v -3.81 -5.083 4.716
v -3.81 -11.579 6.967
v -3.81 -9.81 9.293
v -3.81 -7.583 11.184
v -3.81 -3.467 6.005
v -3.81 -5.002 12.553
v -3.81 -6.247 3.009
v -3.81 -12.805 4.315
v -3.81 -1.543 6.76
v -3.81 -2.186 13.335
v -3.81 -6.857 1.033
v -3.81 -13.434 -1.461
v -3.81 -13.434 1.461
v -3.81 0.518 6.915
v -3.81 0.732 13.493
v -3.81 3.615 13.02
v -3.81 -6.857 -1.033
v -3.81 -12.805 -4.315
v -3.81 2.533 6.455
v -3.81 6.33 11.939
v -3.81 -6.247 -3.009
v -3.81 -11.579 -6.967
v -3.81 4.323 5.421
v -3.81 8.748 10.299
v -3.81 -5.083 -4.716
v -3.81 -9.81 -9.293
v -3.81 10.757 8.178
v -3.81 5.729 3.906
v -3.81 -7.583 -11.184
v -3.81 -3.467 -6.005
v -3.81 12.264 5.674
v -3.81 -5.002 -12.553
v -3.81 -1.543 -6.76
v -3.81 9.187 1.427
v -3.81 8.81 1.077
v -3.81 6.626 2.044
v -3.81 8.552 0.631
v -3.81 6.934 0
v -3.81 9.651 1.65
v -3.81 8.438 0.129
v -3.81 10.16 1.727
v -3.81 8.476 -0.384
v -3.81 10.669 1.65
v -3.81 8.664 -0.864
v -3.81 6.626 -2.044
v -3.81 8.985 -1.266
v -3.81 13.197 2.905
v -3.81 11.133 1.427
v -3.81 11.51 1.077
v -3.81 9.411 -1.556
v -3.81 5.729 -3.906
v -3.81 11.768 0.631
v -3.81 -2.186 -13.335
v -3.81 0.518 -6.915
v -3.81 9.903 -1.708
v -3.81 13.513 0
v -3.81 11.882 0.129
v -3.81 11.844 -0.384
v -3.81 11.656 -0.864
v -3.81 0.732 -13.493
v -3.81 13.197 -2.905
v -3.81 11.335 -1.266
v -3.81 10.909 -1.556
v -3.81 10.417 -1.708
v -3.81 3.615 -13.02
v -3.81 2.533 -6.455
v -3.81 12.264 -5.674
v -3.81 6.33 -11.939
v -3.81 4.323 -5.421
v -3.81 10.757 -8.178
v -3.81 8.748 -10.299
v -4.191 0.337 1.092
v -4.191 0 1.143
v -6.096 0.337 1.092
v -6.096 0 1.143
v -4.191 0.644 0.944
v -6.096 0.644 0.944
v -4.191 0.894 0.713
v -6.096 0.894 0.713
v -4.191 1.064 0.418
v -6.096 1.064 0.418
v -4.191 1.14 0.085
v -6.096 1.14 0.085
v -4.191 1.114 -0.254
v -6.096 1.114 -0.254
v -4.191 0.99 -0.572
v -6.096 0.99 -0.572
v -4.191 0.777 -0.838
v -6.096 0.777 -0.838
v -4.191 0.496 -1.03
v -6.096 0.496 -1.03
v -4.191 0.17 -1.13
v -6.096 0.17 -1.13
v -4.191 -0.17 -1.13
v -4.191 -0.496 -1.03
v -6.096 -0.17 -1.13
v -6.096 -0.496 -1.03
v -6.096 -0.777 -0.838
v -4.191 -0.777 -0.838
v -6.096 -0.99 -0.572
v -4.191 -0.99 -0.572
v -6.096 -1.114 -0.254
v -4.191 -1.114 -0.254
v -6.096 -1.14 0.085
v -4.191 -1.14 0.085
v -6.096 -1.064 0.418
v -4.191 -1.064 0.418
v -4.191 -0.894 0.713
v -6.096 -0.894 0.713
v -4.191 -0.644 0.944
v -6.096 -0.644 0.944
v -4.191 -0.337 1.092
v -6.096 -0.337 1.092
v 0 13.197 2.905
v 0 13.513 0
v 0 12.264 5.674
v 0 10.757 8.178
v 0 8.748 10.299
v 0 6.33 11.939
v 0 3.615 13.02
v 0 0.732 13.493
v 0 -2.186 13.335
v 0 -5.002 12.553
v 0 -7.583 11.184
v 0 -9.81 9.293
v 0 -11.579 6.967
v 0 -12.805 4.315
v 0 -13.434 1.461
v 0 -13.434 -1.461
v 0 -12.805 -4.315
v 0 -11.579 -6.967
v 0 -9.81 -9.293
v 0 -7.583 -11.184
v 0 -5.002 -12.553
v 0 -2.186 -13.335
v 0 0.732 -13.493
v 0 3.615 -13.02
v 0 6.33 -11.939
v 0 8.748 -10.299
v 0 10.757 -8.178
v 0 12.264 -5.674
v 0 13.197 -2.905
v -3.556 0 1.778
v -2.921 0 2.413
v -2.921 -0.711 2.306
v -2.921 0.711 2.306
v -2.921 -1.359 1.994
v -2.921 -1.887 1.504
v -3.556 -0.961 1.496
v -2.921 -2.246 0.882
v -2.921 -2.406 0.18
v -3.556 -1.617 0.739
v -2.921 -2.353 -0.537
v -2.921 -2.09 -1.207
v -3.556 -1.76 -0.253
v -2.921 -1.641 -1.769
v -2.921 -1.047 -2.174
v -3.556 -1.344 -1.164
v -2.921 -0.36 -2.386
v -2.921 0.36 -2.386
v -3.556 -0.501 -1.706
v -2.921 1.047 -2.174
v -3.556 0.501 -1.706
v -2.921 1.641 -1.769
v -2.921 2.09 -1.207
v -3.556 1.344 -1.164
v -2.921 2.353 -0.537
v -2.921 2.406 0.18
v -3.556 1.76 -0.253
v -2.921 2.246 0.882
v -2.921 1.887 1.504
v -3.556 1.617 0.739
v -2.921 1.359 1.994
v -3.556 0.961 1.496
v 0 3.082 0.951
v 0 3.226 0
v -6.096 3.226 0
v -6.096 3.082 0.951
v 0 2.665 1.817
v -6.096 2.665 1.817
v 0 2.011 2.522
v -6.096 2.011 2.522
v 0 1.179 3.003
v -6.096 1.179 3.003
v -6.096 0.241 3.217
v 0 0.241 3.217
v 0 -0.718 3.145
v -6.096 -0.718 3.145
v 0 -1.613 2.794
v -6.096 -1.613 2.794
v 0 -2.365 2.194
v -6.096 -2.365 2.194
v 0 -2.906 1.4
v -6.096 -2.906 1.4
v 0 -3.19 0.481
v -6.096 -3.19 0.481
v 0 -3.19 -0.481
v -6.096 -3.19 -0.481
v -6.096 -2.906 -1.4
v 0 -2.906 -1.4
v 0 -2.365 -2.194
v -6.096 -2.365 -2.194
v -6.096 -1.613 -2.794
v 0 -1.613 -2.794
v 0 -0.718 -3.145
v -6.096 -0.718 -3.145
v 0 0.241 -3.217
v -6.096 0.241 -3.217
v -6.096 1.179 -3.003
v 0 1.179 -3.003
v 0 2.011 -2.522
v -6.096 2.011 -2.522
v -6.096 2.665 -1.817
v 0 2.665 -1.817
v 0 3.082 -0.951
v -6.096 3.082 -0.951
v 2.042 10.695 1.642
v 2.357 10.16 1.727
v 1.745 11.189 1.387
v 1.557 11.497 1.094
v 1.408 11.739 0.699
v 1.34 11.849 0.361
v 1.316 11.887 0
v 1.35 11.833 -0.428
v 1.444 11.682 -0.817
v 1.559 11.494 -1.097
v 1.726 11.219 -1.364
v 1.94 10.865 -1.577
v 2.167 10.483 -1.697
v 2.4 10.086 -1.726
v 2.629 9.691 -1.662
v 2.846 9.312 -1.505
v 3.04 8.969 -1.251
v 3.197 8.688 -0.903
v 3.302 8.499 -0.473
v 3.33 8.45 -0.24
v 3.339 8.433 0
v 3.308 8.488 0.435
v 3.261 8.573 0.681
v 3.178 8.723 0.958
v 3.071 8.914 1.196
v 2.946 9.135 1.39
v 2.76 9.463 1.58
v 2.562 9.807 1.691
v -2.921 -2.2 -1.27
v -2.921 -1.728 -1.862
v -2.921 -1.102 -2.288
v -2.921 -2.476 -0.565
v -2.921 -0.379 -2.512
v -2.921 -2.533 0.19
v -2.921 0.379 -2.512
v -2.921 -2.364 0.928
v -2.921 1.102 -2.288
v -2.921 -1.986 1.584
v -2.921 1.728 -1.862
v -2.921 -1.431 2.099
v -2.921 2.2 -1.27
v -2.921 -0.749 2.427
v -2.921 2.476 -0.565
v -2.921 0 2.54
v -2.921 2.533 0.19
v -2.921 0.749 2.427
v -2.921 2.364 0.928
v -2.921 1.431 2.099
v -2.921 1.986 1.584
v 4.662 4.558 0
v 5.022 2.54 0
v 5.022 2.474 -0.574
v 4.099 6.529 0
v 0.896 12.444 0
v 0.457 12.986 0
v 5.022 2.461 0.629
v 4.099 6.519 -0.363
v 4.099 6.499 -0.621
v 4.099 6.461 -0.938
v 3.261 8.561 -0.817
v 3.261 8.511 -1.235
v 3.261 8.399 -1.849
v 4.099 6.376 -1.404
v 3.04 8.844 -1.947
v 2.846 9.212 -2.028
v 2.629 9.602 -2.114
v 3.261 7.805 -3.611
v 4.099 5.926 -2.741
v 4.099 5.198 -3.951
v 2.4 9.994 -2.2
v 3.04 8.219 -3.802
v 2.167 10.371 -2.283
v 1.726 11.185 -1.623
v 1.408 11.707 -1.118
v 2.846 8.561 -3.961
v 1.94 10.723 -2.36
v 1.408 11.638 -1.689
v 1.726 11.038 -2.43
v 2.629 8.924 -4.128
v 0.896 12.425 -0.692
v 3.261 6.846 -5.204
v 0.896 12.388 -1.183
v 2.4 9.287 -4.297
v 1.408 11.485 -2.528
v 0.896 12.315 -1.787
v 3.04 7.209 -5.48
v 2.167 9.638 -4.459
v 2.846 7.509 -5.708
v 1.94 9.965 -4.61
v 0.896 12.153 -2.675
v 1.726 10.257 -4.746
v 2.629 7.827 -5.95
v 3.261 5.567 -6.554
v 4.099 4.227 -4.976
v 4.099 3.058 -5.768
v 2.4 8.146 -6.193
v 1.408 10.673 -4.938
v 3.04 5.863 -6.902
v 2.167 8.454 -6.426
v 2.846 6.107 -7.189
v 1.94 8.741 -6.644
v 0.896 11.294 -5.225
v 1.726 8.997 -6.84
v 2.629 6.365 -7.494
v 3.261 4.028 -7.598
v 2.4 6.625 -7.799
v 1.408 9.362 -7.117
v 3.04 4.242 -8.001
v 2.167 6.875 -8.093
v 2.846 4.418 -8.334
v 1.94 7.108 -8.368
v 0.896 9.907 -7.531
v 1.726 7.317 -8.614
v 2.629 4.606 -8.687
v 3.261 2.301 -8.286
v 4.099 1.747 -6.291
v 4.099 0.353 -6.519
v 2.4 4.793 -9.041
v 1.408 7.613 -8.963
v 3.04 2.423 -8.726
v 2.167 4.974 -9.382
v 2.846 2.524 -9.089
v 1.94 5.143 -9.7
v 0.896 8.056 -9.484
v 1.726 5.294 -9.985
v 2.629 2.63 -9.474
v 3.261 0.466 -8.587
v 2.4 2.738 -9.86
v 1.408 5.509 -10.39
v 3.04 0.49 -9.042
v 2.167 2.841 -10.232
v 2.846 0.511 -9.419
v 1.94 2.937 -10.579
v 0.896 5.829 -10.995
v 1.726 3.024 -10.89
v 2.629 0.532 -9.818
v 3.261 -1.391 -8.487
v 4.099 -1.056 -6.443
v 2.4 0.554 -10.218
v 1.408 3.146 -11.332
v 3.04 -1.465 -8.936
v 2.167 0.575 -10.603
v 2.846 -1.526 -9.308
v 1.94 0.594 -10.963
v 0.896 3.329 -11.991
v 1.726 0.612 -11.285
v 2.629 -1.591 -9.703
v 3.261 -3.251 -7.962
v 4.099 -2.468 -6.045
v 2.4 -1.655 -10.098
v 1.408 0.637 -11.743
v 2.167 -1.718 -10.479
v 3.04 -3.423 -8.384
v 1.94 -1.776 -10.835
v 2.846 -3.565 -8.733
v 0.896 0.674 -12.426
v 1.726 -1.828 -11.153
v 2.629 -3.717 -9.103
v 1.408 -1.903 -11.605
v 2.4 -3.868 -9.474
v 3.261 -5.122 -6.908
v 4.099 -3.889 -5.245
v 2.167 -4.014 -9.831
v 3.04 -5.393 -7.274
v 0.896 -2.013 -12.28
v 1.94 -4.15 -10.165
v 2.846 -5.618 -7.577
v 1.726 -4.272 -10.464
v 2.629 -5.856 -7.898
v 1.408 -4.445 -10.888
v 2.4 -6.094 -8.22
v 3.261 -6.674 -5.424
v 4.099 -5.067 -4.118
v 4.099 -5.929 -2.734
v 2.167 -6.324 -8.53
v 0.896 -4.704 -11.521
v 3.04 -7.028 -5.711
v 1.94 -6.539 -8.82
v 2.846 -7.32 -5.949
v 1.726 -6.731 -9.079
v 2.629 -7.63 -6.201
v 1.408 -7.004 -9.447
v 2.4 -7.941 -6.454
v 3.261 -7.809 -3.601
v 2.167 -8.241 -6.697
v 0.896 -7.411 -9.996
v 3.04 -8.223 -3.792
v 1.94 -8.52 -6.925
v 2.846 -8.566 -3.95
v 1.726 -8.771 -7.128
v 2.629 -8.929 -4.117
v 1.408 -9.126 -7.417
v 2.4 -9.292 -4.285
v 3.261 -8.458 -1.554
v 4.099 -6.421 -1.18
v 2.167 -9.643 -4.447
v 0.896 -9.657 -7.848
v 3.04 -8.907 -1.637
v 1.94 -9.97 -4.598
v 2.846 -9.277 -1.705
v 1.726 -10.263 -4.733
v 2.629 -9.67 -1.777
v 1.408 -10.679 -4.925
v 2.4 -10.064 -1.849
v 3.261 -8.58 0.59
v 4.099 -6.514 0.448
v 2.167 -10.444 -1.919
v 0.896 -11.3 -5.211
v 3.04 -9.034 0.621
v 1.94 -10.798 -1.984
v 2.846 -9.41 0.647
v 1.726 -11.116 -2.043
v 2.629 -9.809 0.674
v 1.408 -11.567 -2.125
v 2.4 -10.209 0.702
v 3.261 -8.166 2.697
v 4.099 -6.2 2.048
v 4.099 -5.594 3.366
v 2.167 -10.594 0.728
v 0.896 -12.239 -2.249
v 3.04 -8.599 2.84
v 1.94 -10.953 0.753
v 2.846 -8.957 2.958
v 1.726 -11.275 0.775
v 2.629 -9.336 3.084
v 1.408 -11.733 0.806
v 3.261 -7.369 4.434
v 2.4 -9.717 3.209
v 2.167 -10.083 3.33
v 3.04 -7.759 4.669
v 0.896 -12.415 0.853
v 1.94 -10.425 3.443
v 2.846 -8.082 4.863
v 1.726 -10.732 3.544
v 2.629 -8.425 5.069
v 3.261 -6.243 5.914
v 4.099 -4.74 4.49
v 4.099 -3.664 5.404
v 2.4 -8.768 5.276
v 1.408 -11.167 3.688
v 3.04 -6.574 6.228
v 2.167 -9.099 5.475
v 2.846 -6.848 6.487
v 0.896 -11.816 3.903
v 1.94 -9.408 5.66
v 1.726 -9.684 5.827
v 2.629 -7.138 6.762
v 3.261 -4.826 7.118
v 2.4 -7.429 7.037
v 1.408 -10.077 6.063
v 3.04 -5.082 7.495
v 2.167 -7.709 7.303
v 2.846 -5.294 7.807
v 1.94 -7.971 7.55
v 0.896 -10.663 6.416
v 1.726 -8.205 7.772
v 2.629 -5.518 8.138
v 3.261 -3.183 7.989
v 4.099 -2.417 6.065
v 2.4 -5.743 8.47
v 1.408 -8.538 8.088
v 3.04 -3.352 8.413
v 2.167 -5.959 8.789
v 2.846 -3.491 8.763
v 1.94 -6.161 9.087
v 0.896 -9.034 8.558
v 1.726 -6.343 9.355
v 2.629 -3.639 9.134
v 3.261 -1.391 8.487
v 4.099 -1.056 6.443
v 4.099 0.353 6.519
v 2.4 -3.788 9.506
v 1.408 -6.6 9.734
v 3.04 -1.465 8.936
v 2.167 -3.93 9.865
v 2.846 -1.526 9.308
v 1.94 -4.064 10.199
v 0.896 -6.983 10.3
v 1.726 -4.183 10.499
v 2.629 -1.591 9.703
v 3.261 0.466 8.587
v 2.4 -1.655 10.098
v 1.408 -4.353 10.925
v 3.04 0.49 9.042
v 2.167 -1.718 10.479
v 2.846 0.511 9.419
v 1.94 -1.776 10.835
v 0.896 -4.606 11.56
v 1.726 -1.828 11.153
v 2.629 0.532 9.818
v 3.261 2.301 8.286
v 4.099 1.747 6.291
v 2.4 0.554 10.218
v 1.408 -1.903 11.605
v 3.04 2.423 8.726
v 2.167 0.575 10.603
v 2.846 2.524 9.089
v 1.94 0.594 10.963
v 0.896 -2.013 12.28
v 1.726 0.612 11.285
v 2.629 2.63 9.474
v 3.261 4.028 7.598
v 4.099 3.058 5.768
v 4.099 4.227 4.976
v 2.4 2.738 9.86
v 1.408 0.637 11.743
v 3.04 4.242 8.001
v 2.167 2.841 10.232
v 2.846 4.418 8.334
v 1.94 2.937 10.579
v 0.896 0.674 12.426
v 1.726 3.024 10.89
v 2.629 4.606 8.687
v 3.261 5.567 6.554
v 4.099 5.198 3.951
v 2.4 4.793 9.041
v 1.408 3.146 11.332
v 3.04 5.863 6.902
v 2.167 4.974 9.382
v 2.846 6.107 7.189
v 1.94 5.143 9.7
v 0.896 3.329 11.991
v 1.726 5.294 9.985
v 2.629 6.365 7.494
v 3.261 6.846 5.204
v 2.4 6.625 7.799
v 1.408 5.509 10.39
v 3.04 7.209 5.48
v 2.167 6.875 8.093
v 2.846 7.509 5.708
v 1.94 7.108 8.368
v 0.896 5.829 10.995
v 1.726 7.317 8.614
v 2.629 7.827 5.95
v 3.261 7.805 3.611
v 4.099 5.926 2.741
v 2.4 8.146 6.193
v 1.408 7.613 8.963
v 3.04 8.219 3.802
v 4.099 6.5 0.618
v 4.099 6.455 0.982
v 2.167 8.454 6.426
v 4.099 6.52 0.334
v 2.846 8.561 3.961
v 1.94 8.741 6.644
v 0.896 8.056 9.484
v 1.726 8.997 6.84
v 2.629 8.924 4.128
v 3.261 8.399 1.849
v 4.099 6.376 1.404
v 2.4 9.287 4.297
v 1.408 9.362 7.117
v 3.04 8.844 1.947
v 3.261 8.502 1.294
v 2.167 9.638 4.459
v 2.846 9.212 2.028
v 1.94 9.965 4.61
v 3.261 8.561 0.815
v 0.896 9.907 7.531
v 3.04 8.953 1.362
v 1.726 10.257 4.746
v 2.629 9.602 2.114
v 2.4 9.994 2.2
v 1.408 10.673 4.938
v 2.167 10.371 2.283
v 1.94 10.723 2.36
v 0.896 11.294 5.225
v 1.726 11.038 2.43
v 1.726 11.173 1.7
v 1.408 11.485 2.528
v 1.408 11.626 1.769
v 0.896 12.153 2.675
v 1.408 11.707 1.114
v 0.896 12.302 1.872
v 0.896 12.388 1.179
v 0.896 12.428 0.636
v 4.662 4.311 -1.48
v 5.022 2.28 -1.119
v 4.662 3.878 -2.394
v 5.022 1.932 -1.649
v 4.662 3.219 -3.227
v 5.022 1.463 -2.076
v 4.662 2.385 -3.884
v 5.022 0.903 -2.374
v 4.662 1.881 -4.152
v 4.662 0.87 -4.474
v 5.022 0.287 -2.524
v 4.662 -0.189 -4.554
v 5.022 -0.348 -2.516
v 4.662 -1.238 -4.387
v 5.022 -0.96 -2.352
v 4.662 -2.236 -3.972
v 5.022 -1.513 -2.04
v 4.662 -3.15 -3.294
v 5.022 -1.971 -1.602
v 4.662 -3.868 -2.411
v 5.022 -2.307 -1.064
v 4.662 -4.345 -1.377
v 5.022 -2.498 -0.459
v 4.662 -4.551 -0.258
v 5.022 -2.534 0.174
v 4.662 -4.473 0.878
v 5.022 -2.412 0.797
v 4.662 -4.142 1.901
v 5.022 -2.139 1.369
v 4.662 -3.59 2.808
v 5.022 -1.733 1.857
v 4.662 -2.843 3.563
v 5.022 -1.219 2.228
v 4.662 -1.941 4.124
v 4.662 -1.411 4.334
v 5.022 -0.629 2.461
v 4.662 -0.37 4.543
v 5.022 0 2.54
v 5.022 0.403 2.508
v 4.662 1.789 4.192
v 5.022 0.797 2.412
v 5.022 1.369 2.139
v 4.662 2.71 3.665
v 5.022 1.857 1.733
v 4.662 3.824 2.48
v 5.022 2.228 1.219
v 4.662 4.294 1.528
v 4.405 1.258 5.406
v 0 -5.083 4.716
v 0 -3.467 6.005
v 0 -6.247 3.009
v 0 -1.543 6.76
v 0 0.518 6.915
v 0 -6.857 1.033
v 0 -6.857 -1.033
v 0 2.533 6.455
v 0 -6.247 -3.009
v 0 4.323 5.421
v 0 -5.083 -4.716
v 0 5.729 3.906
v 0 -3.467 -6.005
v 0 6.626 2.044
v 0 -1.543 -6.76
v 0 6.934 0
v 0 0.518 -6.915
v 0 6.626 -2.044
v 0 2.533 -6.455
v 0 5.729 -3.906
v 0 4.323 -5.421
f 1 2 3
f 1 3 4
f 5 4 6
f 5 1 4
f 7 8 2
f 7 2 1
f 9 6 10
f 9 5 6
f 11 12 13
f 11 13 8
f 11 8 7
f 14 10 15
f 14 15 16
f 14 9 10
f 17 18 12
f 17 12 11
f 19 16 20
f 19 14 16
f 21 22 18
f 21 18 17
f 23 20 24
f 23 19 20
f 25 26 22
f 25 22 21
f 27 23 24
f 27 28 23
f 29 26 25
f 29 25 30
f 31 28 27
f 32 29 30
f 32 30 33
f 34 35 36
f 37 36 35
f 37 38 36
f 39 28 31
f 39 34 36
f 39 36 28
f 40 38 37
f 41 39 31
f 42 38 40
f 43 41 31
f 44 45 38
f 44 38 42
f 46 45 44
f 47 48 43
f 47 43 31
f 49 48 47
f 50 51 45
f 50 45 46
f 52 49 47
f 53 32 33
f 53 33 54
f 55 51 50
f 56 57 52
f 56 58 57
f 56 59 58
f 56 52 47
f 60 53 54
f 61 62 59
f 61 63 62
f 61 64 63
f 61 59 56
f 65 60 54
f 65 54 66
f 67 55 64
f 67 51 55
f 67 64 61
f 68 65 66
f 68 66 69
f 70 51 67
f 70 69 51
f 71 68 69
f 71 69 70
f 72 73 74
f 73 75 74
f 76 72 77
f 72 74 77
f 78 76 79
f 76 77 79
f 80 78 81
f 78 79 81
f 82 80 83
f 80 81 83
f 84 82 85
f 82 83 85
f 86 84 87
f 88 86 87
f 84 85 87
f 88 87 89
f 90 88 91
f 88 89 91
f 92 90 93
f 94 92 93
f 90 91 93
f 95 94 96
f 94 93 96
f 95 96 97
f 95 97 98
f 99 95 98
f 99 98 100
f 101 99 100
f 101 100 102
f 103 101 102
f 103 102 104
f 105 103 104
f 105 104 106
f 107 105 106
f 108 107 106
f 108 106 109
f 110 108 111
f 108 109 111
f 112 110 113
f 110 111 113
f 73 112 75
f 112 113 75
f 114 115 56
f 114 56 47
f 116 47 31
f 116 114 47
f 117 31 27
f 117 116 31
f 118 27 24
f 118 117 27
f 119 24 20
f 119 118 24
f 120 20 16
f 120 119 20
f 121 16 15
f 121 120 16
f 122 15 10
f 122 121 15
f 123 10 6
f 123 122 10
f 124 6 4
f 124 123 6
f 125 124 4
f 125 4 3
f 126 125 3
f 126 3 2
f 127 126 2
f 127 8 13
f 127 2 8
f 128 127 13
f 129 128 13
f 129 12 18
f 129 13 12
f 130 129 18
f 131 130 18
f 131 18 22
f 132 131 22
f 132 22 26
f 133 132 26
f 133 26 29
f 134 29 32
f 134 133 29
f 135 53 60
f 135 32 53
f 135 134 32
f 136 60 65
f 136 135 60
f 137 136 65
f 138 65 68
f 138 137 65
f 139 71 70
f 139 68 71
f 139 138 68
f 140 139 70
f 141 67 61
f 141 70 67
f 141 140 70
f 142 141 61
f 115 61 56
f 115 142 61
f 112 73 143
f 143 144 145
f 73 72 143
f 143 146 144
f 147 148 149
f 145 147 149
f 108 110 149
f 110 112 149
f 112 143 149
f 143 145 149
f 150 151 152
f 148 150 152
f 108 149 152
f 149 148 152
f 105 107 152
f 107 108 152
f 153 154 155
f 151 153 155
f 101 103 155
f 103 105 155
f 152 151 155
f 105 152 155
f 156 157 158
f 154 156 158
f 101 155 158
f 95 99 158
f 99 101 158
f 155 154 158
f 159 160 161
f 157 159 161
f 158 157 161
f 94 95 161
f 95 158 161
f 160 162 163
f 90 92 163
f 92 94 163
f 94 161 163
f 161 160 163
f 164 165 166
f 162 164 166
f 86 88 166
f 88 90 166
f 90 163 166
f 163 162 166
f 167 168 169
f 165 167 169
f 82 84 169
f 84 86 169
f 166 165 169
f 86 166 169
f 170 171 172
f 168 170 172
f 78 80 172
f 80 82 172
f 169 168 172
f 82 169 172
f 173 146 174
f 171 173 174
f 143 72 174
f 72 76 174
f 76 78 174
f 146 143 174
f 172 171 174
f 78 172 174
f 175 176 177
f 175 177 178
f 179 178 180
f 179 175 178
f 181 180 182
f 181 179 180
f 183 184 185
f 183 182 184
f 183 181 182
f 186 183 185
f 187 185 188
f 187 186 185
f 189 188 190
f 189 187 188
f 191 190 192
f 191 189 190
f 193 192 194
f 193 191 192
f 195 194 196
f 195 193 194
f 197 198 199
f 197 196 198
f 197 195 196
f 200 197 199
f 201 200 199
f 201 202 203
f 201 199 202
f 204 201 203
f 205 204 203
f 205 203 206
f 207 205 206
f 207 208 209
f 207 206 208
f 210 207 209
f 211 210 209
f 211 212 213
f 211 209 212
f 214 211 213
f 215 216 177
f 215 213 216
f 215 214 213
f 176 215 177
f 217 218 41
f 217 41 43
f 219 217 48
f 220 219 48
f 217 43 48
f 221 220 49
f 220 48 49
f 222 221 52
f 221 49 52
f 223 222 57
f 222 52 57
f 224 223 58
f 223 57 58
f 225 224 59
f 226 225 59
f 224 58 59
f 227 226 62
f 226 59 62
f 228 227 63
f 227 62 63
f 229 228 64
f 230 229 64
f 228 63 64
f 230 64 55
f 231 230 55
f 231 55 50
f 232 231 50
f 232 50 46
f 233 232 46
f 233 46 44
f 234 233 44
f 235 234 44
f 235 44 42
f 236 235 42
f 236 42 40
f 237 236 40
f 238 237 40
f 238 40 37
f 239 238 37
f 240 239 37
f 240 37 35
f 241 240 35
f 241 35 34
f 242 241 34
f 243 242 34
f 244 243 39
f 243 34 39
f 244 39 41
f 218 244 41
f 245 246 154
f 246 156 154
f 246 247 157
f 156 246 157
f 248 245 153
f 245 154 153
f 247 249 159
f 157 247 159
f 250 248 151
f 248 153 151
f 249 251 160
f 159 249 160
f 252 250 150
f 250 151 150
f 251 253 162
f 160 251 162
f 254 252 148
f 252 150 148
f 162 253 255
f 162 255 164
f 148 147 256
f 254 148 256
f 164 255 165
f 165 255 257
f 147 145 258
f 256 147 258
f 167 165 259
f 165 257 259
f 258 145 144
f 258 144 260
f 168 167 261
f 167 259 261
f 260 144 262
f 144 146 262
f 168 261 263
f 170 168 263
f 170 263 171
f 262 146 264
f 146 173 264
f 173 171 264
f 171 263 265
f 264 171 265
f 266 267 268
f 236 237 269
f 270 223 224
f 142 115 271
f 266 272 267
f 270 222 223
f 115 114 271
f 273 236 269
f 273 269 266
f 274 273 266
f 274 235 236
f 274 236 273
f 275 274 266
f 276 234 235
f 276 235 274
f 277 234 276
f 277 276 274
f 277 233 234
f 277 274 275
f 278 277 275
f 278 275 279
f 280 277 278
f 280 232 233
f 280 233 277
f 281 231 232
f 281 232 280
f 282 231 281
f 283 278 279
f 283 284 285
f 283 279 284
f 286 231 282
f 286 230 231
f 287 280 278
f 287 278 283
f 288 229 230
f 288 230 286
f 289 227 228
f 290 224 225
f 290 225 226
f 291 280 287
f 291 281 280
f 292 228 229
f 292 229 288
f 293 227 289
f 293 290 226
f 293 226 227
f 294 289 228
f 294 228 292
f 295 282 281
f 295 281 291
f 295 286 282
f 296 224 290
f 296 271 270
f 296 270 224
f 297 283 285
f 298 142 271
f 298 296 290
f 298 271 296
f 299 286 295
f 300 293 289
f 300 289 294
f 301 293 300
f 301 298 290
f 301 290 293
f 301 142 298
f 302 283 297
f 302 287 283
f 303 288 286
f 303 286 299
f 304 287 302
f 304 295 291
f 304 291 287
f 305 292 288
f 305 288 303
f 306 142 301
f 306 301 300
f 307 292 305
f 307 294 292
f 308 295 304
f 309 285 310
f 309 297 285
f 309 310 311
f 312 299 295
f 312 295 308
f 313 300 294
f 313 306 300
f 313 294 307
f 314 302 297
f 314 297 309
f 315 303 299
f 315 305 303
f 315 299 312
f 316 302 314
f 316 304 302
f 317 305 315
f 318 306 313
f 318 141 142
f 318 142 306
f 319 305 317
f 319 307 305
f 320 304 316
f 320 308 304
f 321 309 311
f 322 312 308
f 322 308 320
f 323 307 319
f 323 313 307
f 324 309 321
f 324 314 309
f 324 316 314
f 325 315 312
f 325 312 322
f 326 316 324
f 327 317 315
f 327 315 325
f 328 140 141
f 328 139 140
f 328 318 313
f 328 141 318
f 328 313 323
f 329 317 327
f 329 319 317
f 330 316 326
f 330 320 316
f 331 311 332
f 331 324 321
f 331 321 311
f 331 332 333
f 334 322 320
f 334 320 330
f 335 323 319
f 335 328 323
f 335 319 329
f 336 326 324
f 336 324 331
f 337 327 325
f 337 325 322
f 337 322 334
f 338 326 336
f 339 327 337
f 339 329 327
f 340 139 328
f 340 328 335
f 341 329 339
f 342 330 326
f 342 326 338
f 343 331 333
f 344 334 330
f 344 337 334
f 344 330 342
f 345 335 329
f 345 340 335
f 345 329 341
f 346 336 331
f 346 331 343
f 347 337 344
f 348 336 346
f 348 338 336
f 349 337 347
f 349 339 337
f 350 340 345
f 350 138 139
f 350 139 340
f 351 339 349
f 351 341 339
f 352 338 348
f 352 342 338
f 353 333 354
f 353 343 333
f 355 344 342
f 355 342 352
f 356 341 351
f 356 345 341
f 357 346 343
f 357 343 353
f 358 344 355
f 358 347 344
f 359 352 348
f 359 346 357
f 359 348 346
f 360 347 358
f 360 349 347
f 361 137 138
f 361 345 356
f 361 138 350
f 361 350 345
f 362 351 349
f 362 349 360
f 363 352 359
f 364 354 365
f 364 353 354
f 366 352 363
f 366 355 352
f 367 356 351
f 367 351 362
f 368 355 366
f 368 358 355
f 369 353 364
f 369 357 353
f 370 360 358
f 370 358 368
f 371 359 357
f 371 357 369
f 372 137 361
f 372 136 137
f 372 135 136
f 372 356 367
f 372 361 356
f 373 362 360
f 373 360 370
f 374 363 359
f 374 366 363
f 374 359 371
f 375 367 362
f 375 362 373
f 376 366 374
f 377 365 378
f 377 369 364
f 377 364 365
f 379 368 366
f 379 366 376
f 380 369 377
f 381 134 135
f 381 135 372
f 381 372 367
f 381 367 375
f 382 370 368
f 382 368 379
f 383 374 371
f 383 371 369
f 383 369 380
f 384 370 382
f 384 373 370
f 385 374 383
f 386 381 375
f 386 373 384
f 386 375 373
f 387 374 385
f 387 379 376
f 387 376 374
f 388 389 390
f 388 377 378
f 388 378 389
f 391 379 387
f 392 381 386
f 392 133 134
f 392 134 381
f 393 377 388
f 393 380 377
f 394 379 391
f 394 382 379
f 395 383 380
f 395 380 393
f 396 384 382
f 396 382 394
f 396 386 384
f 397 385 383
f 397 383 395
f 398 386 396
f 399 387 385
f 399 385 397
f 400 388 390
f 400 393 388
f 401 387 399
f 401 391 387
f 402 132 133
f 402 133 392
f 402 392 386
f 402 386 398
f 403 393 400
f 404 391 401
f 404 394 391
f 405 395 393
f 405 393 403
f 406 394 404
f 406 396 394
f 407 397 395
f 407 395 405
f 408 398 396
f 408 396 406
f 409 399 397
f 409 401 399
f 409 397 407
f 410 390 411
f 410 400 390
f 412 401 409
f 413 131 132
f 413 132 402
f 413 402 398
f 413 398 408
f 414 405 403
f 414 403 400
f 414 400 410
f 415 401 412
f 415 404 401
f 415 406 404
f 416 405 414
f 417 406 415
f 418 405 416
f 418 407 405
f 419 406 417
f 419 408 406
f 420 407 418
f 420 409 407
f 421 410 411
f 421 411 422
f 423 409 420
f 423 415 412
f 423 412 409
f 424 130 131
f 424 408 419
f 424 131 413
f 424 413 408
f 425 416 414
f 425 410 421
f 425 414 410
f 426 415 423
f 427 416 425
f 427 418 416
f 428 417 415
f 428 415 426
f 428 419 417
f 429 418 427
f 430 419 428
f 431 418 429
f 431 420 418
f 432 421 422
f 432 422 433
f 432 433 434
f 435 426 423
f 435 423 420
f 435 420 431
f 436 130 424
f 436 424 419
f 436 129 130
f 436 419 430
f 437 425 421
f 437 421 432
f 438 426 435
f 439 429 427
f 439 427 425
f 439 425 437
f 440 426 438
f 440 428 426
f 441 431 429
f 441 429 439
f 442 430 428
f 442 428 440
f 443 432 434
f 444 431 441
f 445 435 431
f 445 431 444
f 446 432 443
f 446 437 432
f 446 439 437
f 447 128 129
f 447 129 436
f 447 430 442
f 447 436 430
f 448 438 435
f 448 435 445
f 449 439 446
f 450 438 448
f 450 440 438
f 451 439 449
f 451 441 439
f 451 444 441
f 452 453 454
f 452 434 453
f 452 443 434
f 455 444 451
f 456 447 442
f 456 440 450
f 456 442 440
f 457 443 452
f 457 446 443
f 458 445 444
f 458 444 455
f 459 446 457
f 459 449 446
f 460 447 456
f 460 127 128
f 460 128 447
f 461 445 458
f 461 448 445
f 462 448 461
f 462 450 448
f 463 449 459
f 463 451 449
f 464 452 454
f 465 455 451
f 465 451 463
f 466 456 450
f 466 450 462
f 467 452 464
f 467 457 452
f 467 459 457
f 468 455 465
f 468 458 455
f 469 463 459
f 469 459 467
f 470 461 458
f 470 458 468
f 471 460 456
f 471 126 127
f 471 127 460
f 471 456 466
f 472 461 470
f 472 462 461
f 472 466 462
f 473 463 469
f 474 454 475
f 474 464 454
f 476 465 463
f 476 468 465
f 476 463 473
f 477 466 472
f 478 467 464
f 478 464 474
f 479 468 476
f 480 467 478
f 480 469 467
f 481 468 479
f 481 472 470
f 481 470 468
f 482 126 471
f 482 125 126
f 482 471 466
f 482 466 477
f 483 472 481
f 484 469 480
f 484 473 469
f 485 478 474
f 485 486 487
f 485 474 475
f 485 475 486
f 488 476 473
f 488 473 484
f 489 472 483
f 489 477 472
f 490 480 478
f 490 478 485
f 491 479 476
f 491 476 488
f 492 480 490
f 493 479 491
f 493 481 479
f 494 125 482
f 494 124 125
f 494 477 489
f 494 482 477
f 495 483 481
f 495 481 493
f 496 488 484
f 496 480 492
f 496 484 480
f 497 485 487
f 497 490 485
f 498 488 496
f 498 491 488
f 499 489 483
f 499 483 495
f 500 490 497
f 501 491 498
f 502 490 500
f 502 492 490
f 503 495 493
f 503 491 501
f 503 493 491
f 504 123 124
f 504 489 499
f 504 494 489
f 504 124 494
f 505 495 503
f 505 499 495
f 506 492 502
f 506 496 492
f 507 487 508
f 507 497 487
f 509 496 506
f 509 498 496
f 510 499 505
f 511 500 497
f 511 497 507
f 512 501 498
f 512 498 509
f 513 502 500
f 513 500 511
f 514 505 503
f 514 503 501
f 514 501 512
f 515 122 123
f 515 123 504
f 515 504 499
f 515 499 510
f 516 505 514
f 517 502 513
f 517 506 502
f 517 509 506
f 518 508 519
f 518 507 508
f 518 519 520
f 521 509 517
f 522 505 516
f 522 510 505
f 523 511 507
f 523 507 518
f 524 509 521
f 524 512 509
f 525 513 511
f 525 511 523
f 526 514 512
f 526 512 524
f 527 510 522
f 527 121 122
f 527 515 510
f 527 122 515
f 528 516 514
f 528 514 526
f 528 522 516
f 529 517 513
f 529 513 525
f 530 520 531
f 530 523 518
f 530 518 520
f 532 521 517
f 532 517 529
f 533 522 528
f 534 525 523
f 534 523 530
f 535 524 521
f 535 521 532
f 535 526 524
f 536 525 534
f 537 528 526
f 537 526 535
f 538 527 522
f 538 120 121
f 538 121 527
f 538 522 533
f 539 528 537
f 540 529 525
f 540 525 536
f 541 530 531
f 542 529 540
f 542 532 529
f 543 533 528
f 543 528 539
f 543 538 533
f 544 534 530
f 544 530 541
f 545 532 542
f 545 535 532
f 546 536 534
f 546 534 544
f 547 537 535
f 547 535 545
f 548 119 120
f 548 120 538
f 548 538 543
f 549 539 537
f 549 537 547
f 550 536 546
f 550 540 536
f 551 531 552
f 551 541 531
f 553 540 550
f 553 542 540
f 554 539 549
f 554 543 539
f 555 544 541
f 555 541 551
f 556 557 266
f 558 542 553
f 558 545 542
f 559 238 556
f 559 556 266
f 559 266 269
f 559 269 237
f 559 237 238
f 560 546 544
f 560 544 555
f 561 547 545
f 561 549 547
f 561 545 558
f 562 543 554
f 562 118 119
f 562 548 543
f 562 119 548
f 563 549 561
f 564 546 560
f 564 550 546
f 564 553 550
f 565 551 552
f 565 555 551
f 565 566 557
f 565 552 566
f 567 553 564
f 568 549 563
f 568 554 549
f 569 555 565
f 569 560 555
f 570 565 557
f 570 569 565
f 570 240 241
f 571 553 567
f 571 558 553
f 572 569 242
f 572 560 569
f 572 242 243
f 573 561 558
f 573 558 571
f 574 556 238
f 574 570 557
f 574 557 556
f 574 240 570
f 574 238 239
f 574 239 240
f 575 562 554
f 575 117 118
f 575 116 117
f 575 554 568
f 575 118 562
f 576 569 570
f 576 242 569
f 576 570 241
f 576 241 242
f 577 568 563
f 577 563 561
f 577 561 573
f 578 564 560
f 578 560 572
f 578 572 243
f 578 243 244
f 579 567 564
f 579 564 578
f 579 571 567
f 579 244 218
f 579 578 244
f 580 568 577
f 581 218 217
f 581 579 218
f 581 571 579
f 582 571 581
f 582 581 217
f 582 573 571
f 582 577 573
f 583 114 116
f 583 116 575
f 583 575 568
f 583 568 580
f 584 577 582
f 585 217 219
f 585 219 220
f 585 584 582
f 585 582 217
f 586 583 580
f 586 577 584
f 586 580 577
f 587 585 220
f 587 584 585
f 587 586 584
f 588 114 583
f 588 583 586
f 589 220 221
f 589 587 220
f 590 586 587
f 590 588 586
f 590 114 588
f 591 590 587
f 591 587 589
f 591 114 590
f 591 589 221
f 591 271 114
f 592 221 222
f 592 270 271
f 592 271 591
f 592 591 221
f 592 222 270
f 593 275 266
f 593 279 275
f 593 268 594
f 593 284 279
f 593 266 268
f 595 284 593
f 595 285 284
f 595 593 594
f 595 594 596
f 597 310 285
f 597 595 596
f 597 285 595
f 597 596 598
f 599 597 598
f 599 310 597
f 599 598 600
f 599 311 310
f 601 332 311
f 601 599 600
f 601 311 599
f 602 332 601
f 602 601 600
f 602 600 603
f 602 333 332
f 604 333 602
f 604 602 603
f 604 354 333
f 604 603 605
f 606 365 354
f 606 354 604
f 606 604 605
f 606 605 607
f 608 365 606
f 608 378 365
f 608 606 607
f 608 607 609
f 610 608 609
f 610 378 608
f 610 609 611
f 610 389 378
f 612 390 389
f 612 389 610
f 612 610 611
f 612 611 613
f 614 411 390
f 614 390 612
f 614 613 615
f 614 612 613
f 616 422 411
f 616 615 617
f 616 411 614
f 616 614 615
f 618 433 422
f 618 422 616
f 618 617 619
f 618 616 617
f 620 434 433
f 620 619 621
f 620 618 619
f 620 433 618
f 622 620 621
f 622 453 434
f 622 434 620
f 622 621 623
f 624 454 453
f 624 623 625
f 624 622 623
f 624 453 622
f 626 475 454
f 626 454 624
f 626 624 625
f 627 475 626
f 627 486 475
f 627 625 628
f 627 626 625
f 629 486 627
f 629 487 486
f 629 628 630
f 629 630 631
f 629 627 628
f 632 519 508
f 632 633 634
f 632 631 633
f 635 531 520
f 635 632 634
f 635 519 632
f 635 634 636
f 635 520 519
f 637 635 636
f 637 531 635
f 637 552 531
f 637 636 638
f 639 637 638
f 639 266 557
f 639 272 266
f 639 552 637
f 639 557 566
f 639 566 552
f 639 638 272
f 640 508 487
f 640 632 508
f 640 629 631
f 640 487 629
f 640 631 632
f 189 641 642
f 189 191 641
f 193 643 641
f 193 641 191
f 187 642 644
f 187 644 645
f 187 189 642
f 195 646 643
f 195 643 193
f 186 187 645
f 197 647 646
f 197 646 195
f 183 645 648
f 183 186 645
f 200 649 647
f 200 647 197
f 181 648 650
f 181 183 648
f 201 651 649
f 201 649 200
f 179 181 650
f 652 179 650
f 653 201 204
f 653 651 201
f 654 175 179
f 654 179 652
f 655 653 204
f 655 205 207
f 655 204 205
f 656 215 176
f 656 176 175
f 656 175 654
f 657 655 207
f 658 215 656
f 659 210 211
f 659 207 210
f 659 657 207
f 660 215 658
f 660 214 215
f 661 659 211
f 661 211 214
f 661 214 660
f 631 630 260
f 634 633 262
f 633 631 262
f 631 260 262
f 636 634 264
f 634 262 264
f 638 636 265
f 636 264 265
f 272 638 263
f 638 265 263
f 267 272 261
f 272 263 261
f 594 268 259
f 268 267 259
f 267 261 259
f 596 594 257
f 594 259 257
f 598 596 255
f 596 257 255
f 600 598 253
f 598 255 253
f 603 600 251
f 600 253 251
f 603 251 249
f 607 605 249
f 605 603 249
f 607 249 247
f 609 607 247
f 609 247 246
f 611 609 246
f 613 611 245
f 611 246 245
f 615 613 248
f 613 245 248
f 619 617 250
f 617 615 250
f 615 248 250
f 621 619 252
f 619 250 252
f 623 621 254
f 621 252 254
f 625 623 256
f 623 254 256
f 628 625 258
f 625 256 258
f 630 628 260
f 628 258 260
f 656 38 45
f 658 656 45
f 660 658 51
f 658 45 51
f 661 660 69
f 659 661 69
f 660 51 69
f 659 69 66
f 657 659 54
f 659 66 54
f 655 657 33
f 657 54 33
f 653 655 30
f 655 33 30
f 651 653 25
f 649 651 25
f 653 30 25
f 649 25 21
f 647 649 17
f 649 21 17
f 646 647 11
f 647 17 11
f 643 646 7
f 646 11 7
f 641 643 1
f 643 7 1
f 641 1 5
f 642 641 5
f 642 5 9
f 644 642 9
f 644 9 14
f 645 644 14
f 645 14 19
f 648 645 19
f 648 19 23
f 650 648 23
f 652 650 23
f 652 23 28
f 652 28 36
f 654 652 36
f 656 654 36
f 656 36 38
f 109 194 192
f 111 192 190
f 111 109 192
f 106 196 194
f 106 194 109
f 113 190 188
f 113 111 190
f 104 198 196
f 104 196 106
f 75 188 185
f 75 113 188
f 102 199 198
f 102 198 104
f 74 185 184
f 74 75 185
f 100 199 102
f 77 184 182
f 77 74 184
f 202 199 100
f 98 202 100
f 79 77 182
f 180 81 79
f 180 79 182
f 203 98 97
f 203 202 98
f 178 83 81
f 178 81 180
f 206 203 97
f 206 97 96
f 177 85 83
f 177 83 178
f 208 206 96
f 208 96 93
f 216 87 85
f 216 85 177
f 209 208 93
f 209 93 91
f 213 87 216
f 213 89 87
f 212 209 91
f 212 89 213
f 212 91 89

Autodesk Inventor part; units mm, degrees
ref_plane "XZ Plane" through (0, 0, 0) normal (0, 1, 0) x (-1, 0, 0)
sketch "Sketch1" plane through (0, 0, 0) normal (0, 0, 1) x (1, 0, 0)
  line L0 (0, 0) -> (-8.052, 0) construction
  line L1 (-6.096, 2.032) -> (5.08, 2.032)
  line L2 (-6.096, 2.032) -> (-6.096, 3.2258)
  line L3 (-6.096, 3.2258) -> (0, 3.2258)
  line L4 (0, 3.2258) -> (0, 6.9342)
  line L5 (0, 6.9342) -> (-3.81, 6.9342)
  line L6 (-3.81, 6.9342) -> (-3.81, 13.5128)
  line L7 (-3.81, 13.5128) -> (0, 13.5128)
  arc A0 (5.08, 2.032) -> (0, 13.5128) centre (-15.0256, 0) ccw
  dimension "d0" = 2.032
  dimension "d1" = 13.5128
  dimension "d2" = 6.096
  dimension "d3" = 3.2258
  dimension "d4" = 3.81
  dimension "d5" = 6.9342
  dimension "d7" = 5.08
revolve "Revolution1" add sketch "Sketch1" angle 360 about axis through (0, 0, 0) along (-1, 0, 0)
ref_plane "Work Plane3" through (3.9124, 0, 0) normal (1, 0, 0) x (0, 1, 0)
ref_plane "Work Plane2" through (5.1824, 0, 0) normal (1, 0, 0) x (0, 1, 0)
sketch "Sketch4" plane through (-3.81, 0, 0) normal (-1, 0, 0) x (0, 0, 1)
  circle A0 centre (0, 10.16) radius 1.7272 projected
extrude "Extrusion3" cut sketch "Sketch4" against normal through all
sketch "Sketch5" plane through (-6.096, 0, 0) normal (-1, 0, 0) x (0, 0, 1)
  circle A0 centre (0, 0) radius 2.032 projected
  circle A1 centre (0, 0) radius 3.2258 projected
  circle A2 centre (0, 0) radius 1.143
  dimension "d18" = 2.286
extrude "Extrusion4" add sketch "Sketch5" against normal up to surface contours A0
ref_plane "Work Plane4" through (-2.921, 0, 0) normal (-1, 0, 0) x (0, 0, 1)
sketch "Sketch6" plane through (-2.921, 0, 0) normal (-1, 0, 0) x (0, 0, 1)
  circle A0 centre (0, 0) radius 2.54
  dimension "d22" = 5.08
extrude "Extrusion5" cut sketch "Sketch6" against normal through all
chamfer "Chamfer1" distance 1.27 angle 45 1 edges at (-2.921, 0, -1.143)
properties part number "Flexiwheel Hub - Out Side"
